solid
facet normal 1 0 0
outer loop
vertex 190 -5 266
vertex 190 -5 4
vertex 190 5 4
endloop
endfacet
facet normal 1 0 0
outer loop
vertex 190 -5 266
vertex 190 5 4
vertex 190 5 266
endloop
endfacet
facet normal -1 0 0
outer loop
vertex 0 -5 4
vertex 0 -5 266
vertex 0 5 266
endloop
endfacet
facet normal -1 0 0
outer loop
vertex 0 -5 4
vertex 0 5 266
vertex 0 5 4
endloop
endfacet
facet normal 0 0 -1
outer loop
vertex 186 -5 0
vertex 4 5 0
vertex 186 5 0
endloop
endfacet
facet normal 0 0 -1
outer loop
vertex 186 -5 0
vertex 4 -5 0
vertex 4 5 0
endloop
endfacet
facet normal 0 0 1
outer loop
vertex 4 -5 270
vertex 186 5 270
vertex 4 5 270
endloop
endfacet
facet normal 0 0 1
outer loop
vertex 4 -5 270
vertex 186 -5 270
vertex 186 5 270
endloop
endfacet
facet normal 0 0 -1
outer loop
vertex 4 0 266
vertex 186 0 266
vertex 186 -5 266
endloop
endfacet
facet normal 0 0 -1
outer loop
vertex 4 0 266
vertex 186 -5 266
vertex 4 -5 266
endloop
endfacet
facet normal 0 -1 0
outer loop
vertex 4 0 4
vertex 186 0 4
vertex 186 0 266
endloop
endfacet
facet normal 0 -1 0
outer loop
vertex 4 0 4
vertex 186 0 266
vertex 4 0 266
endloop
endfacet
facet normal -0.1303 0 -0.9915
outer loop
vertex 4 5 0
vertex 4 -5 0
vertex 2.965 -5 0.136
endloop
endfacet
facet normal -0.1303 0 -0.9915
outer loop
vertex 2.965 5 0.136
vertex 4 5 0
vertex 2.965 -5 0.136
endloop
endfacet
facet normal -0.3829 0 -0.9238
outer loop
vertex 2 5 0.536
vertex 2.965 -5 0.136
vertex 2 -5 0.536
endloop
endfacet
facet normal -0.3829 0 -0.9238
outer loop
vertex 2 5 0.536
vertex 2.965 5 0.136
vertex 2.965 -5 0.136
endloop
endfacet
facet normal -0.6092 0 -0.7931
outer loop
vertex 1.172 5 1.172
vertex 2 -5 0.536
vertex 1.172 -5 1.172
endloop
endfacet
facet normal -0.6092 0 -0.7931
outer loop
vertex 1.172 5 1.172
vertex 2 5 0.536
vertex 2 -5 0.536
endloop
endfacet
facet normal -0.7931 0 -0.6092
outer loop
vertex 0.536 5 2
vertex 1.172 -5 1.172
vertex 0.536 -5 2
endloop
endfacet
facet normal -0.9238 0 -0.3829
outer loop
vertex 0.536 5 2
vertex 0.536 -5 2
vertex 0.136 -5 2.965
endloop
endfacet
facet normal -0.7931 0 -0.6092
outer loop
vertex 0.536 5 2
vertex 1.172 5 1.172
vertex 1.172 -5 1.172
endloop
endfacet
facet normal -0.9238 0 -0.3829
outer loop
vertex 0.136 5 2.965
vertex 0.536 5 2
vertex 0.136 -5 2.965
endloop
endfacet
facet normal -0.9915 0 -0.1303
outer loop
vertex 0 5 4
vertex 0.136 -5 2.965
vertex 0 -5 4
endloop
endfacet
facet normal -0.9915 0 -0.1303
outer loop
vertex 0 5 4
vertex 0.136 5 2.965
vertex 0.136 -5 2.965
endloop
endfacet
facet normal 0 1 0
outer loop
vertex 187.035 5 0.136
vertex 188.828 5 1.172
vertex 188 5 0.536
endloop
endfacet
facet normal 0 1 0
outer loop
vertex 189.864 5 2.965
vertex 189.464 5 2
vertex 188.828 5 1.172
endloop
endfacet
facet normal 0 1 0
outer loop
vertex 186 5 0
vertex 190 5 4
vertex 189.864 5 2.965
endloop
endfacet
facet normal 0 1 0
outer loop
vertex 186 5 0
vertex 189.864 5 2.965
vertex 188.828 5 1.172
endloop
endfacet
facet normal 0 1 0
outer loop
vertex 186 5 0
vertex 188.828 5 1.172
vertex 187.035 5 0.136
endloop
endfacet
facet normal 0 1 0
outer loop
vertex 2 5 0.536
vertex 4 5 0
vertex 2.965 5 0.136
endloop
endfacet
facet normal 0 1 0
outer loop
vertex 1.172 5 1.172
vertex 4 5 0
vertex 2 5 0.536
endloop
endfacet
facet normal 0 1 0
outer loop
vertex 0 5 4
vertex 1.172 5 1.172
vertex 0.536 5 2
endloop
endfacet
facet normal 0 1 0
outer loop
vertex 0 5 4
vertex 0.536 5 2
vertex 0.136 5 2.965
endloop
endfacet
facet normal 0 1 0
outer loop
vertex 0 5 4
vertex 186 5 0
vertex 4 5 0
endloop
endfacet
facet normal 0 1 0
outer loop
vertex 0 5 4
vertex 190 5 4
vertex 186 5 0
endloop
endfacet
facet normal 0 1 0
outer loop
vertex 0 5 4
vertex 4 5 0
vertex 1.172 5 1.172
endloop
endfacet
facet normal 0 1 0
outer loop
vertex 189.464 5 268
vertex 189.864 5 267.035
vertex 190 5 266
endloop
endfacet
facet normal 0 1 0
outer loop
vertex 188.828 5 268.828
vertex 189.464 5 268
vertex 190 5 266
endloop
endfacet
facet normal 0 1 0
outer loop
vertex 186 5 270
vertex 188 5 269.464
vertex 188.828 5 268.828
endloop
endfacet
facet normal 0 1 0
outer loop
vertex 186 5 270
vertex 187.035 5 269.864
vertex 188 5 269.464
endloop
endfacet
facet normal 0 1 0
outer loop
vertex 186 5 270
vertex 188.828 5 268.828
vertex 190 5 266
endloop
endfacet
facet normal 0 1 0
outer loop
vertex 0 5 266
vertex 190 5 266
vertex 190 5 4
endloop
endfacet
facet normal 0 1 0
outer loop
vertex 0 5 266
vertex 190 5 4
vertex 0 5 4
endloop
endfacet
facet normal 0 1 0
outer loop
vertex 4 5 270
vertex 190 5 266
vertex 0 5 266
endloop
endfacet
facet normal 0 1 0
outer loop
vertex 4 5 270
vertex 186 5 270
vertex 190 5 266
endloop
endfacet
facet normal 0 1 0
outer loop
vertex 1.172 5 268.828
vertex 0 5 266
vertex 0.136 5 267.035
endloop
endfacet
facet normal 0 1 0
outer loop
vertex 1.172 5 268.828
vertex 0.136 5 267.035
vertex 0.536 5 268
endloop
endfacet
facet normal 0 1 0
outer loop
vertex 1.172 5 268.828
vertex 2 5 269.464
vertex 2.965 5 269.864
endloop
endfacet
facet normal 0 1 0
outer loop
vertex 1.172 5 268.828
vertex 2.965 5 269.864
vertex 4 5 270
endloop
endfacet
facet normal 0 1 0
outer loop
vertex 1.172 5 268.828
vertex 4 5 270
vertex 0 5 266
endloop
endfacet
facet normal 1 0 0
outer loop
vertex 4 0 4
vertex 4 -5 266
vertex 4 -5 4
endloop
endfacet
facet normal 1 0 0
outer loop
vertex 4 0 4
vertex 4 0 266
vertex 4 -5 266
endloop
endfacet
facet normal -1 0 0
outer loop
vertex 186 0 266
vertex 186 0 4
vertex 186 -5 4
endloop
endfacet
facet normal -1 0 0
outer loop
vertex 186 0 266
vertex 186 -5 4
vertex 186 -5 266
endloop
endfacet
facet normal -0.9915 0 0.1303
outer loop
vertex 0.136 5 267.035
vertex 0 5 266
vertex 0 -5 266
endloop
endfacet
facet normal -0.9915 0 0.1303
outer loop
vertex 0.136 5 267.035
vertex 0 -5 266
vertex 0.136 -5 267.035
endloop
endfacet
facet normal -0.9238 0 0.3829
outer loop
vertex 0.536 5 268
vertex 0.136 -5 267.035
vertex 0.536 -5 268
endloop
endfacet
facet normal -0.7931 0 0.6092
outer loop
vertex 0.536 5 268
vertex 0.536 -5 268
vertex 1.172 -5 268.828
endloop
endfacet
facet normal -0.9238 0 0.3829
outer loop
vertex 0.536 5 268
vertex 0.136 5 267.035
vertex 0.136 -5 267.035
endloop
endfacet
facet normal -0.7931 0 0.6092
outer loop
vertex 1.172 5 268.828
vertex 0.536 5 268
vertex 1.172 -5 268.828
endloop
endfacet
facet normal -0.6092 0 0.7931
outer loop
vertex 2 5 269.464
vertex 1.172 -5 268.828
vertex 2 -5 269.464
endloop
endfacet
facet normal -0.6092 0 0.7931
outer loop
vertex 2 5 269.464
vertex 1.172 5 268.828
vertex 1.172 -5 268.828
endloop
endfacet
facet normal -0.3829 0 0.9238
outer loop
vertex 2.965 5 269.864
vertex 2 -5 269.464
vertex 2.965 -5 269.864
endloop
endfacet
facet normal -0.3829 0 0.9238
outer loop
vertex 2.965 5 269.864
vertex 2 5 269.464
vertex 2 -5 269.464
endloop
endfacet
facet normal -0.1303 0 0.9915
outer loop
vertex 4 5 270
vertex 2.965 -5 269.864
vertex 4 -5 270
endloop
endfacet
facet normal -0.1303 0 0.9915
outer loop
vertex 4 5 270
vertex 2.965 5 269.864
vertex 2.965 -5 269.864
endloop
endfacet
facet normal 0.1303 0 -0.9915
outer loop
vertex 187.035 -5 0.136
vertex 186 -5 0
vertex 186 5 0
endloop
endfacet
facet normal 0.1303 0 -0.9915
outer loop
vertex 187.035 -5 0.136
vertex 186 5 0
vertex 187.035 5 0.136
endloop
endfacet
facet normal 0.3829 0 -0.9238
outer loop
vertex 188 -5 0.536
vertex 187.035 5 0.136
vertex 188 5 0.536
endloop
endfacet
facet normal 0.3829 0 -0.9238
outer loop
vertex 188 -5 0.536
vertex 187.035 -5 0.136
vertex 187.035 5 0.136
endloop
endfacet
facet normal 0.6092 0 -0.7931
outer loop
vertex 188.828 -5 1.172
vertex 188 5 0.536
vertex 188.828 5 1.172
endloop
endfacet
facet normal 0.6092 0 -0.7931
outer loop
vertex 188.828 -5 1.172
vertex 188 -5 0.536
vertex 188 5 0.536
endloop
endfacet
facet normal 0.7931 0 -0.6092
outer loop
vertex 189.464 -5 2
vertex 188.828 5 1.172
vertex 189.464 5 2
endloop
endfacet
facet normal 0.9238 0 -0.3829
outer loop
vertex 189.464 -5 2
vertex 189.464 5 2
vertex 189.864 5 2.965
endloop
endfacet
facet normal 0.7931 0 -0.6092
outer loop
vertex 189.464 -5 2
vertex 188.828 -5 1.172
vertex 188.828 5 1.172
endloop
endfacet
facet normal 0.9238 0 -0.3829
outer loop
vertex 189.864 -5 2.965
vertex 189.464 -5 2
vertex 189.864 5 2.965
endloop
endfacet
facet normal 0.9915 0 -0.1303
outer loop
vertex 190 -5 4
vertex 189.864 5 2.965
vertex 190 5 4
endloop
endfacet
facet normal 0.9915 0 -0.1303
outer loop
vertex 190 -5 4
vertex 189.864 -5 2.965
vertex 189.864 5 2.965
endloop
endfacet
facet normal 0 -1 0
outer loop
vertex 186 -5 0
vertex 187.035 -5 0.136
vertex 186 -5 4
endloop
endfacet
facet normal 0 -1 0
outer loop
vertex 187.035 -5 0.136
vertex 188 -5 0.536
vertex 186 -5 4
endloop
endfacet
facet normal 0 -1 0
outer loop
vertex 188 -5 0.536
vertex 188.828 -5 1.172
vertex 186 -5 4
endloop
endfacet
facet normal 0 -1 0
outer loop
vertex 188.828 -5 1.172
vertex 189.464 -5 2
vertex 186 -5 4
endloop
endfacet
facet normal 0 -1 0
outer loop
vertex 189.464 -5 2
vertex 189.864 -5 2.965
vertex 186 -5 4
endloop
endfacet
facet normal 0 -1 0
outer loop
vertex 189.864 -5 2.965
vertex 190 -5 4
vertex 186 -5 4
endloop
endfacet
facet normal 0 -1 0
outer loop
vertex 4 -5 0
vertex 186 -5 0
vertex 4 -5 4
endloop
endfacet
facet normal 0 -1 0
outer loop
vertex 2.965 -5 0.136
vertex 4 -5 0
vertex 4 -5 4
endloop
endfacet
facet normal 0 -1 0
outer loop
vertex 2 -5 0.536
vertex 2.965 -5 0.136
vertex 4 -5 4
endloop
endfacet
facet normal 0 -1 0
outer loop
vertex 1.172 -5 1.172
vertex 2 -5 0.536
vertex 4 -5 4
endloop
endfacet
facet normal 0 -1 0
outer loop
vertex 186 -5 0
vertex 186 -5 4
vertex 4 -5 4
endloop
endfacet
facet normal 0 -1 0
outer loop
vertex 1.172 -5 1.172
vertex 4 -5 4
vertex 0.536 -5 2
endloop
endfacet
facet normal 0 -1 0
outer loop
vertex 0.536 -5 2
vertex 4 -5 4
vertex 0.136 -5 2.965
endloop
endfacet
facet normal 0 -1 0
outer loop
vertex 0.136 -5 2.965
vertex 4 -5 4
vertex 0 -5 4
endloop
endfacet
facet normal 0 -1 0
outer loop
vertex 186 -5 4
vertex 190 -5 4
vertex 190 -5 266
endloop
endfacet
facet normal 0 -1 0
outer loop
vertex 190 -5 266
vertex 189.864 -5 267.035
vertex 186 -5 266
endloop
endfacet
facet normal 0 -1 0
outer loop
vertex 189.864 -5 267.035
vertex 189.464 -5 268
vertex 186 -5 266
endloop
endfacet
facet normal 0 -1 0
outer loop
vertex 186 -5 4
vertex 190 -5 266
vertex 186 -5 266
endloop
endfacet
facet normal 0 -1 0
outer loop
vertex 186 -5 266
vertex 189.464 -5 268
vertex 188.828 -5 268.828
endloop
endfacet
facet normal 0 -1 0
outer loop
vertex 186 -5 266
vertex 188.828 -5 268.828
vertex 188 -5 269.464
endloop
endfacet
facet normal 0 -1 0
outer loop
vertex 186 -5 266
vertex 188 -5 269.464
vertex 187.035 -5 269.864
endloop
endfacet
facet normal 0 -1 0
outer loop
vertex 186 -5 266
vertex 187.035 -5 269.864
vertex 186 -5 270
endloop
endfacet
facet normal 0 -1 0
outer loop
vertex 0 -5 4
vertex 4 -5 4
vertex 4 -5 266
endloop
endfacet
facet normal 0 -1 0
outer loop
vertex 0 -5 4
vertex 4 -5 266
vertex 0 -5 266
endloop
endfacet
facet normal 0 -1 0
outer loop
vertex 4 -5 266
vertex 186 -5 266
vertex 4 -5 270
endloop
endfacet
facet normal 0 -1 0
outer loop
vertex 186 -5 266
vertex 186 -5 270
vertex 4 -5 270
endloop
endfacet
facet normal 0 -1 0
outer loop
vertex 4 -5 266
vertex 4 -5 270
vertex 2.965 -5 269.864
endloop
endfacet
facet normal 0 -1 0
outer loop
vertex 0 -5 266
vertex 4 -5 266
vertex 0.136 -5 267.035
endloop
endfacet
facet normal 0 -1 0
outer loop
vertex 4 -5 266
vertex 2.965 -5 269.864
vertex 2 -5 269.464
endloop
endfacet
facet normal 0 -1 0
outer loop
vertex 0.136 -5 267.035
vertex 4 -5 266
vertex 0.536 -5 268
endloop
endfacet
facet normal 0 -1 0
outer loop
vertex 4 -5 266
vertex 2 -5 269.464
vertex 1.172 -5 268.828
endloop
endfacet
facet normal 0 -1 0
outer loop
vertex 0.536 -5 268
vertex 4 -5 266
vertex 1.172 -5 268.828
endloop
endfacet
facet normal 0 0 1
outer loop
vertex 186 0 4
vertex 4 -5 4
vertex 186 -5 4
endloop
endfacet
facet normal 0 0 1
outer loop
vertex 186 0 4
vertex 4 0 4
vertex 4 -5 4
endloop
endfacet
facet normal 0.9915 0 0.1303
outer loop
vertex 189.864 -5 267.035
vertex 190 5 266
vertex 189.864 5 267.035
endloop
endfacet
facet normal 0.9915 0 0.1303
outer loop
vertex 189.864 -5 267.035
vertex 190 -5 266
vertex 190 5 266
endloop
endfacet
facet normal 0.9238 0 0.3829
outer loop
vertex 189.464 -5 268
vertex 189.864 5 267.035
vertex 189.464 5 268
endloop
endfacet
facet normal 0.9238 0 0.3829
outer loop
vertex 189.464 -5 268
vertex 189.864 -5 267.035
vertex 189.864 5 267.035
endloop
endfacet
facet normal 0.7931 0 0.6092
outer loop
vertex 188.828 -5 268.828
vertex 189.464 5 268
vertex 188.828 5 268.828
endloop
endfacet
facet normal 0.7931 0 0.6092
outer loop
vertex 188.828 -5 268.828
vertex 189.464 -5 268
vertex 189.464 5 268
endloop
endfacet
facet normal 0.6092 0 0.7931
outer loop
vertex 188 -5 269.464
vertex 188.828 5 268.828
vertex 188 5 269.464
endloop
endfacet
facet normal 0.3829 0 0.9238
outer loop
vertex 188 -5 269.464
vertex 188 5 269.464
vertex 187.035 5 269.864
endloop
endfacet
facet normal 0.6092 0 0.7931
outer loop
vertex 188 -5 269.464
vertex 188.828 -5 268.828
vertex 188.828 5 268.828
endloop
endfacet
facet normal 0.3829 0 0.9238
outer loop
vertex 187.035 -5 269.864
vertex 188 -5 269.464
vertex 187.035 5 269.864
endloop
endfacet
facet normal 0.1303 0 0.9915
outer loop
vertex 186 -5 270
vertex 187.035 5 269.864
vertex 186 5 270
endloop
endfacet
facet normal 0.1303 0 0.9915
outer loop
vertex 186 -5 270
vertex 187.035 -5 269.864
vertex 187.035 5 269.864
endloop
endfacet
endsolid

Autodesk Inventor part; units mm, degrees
ref_plane "YZ Plane" through (0, 0, 0) normal (1, 0, 0) x (0, 1, 0)
ref_plane "XZ Plane" through (0, 0, 0) normal (0, 1, 0) x (-1, 0, 0)
ref_plane "XY Plane" through (0, 0, 0) normal (0, 0, 1) x (1, 0, 0)
sketch "Szkic2" plane through (0, 0, 0) normal (0, 1, 0) x (-1, 0, 0)
  line L0 (0, 0) -> (-190, 0)
  line L1 (-190, 0) -> (-190, 270)
  line L2 (-190, 270) -> (0, 270)
  line L3 (0, 270) -> (0, 0)
  dimension "d0" = 190
  dimension "d1" = 270
extrude "Wyciągnięcie proste1" add sketch "Szkic2" along normal mid plane 10
fillet "Zaokrąglenie1" radius 4 4 edges at (190, 0, 0) (0, 0, 0) (0, 0, 270) (190, 0, 270)
sketch "Szkic4" plane through (0, 0, 0) normal (0, 1, 0) x (-1, 0, 0)
  line L0 (-4, 4) -> (-186, 4)
  line L1 (-186, 4) -> (-186, 266)
  line L2 (-186, 266) -> (-4, 266)
  line L3 (-4, 266) -> (-4, 4)
  line L4 (-186, 0) -> (-4, 0) projected
  line L5 (0, 4) -> (0, 266) projected
  line L6 (-190, 266) -> (-190, 4) projected
  line L7 (-4, 270) -> (-186, 270) projected
  point P0 (0, 0)
  dimension "d13" = 4
  dimension "d14" = 4
  dimension "d16" = 4
  dimension "d17" = 4
extrude "Wyciągnięcie proste3" cut sketch "Szkic4" against normal blind 5
properties part number "klapka1"
